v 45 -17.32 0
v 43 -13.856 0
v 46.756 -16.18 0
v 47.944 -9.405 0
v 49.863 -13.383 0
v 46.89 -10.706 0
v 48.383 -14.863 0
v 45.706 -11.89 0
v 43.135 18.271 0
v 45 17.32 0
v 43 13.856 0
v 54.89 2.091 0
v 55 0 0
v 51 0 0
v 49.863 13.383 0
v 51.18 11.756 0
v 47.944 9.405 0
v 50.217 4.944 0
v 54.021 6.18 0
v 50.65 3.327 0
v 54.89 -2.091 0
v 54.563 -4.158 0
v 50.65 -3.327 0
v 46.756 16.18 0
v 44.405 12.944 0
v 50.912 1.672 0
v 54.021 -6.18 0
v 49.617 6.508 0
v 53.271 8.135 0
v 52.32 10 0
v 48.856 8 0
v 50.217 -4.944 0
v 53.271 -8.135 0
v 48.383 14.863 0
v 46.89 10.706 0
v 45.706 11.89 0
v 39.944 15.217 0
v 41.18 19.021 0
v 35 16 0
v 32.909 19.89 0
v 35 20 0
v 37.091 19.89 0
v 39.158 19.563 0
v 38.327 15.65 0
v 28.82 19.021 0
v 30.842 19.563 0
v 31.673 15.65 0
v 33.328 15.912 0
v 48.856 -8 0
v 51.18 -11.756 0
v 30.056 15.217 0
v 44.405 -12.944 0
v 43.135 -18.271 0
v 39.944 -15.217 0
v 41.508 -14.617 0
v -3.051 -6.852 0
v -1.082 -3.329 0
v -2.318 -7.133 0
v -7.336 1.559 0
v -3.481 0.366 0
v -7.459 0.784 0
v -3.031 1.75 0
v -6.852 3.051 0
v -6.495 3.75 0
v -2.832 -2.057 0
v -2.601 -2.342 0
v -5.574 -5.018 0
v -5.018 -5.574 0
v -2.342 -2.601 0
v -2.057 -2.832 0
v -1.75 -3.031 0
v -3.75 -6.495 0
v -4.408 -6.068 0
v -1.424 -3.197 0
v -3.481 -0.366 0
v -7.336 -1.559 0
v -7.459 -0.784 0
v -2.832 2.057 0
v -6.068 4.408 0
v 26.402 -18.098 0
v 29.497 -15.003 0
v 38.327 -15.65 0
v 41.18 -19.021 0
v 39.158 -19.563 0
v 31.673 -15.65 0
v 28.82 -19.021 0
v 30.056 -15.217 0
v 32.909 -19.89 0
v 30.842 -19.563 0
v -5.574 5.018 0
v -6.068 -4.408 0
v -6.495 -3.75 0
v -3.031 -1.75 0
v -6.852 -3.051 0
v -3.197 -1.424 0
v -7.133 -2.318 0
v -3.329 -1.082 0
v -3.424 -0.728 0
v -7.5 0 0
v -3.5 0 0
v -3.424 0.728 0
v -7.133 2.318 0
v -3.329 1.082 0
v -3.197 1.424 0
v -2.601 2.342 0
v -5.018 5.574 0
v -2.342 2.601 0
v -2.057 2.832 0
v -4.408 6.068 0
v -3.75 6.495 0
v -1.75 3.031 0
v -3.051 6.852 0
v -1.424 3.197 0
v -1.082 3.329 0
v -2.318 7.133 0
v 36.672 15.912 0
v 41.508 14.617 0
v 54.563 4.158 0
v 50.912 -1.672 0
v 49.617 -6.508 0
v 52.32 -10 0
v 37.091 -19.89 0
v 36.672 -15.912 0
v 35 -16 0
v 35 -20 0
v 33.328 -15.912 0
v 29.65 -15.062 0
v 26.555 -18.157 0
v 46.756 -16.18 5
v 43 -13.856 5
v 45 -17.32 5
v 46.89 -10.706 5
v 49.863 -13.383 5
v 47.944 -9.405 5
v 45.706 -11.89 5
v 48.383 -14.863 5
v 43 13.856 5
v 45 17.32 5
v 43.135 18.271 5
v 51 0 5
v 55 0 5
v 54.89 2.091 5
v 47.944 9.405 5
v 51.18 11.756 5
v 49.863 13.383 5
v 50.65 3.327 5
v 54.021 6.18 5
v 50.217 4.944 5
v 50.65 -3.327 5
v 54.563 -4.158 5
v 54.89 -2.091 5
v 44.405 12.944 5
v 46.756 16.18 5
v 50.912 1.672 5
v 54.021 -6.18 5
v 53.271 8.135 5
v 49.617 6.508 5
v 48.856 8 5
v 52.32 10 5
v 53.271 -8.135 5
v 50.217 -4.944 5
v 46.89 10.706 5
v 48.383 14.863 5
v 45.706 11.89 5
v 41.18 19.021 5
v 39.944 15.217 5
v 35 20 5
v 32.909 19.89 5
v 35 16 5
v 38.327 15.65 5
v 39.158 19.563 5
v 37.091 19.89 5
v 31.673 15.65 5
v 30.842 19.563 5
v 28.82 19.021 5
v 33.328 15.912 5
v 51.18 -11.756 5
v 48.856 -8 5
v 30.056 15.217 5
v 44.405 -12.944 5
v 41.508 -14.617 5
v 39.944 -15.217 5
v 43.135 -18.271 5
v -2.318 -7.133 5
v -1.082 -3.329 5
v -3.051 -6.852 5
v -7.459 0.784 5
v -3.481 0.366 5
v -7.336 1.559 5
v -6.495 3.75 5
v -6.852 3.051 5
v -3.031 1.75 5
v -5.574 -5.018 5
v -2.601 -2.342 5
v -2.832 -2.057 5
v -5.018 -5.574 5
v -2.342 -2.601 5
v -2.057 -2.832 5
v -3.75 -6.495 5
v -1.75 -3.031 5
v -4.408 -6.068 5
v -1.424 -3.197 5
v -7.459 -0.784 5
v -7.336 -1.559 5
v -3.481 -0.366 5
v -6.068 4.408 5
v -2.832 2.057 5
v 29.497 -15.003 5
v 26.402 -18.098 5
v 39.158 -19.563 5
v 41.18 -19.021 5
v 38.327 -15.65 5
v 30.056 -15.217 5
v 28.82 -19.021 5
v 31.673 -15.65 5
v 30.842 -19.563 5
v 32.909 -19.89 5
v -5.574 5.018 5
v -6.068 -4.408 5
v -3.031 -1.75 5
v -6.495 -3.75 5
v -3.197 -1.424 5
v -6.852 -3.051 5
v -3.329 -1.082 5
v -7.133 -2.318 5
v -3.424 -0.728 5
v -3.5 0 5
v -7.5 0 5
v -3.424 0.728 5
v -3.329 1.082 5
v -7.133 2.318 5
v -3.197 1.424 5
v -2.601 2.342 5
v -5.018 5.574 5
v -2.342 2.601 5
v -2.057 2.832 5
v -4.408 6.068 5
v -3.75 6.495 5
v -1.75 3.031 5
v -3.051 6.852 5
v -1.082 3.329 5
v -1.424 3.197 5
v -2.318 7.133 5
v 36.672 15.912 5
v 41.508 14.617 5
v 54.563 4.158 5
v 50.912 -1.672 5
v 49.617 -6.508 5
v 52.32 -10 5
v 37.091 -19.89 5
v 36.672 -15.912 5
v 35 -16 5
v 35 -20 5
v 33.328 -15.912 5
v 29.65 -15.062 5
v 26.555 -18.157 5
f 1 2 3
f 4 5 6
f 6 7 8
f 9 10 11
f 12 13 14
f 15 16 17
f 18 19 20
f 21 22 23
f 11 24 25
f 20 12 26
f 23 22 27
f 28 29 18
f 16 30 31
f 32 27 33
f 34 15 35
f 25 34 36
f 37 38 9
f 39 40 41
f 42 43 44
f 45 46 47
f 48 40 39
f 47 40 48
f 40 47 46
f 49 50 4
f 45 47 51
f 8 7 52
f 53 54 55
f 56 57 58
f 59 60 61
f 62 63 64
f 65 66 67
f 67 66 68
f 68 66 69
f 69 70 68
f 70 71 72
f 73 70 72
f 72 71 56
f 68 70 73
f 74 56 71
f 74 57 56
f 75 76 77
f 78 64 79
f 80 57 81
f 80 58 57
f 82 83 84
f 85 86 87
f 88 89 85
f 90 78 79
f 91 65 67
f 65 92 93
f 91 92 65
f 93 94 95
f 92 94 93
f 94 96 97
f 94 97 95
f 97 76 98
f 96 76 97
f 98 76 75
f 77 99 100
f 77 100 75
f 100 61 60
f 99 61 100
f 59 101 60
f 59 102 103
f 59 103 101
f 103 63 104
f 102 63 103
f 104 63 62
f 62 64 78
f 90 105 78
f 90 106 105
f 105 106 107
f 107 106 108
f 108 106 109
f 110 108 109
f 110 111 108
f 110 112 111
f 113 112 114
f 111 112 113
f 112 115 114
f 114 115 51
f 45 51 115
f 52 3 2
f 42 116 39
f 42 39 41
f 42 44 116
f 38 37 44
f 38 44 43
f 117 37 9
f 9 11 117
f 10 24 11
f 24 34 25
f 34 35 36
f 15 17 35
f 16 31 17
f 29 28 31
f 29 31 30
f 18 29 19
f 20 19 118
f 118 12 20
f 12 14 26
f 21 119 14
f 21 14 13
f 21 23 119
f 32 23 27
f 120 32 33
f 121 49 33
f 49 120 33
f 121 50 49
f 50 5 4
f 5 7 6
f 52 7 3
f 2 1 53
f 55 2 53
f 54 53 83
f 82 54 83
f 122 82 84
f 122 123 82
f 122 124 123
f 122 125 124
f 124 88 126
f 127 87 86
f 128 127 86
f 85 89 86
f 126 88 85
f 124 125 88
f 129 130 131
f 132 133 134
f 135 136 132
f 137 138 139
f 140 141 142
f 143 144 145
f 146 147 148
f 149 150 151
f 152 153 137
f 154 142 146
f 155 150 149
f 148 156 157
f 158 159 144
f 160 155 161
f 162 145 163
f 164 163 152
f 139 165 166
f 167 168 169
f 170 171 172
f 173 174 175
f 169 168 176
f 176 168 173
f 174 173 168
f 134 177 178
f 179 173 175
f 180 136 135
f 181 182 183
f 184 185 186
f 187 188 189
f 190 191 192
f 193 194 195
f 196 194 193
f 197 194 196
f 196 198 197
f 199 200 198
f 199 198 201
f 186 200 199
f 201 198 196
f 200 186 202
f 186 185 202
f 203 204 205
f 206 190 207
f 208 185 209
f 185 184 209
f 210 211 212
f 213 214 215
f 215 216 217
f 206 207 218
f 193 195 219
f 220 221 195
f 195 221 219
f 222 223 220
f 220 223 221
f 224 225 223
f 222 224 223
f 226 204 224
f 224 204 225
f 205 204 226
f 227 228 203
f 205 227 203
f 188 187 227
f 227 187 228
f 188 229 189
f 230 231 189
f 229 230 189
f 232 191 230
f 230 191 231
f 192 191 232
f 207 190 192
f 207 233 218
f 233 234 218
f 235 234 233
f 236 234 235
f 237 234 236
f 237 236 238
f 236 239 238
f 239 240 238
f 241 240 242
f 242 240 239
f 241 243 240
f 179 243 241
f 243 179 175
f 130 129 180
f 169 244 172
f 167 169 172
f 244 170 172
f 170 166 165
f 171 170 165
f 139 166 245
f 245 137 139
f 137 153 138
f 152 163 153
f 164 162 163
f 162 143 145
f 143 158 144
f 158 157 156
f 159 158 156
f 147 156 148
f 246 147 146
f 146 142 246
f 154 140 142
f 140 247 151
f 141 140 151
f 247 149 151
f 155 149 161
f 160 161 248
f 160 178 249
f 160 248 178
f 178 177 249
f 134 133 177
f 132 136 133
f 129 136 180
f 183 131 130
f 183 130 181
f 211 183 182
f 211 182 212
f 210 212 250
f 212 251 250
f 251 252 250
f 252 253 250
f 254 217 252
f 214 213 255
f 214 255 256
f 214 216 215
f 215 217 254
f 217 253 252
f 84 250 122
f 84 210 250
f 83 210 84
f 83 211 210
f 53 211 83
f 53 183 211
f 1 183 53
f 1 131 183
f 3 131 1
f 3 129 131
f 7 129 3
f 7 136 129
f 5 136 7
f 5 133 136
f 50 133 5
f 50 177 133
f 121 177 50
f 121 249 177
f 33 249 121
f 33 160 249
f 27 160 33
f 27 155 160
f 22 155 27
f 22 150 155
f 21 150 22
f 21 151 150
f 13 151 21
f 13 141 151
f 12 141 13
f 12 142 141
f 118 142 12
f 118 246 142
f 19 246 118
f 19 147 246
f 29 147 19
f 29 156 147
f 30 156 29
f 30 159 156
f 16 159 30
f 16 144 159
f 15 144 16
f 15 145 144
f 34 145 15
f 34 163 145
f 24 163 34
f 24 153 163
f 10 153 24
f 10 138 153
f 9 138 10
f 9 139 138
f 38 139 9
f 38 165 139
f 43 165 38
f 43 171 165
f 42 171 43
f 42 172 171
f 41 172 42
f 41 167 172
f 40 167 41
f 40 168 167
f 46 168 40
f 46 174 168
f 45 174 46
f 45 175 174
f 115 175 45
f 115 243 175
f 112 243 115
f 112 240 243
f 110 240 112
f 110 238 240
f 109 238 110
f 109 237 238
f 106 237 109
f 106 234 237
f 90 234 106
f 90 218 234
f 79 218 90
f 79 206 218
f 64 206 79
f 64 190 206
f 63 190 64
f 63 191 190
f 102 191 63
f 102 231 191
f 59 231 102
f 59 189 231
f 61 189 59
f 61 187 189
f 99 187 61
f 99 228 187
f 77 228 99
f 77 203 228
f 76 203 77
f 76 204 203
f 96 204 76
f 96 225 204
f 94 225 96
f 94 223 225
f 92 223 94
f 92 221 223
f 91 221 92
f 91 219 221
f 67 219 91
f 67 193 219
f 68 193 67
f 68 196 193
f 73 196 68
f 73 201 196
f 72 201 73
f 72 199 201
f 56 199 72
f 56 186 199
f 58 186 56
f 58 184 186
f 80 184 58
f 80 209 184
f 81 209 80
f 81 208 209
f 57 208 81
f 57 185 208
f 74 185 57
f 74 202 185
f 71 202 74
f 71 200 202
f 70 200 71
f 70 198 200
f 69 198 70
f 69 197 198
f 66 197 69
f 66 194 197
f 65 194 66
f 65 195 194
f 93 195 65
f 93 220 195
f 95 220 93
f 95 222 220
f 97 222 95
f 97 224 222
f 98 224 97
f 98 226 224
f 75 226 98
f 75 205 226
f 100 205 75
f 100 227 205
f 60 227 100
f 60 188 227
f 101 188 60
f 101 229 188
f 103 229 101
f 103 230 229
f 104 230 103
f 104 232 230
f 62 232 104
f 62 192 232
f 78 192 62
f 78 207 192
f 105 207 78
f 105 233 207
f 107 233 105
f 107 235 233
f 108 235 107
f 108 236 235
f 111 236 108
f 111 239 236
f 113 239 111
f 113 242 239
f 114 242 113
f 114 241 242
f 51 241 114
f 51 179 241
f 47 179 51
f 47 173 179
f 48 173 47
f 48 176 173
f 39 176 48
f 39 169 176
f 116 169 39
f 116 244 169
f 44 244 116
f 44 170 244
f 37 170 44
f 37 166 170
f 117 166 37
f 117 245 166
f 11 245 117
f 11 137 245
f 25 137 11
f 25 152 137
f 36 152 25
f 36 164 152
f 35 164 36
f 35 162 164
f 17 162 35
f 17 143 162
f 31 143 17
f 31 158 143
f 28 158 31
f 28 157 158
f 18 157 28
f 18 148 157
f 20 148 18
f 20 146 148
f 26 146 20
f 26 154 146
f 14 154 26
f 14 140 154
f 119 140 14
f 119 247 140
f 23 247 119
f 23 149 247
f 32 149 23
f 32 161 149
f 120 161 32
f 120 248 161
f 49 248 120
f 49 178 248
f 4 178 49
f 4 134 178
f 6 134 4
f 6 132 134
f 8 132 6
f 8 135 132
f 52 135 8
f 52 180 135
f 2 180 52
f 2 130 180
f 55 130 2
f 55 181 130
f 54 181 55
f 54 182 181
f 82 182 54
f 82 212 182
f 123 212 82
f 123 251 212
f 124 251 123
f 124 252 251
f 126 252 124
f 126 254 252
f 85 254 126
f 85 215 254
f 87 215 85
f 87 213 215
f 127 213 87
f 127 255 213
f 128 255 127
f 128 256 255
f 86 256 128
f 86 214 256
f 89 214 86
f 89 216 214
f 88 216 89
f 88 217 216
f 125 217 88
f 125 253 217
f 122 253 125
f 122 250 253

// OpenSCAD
// customisable caribiner Glyn Cowles Dec 2018
// diam of top ring
d1=15; 
// diam of bottom ring
d2=40; 
// distance between centres
dis=35;
// thickness
th=4; 
// height
ht=5; 
// gap size
gap=.15;
// resolution
$fn=60; 

color("gray") linear_extrude(ht) main();

//------------------------------------------------------------
module main() {
    difference() {
    struct(d1,d2,dis);
    struct(d1-th*2,d2-th*2,dis);
    translate([dis*.7,-d2/2,0]) rotate([0,0,-45]) square([gap,th*3]);
        
}
}
//------------------------------------------------------------
module struct(n1,n2,x) {
    hull() {
        circle(d=n1);
        translate([dis,0]) circle(d=n2);
    }
}
